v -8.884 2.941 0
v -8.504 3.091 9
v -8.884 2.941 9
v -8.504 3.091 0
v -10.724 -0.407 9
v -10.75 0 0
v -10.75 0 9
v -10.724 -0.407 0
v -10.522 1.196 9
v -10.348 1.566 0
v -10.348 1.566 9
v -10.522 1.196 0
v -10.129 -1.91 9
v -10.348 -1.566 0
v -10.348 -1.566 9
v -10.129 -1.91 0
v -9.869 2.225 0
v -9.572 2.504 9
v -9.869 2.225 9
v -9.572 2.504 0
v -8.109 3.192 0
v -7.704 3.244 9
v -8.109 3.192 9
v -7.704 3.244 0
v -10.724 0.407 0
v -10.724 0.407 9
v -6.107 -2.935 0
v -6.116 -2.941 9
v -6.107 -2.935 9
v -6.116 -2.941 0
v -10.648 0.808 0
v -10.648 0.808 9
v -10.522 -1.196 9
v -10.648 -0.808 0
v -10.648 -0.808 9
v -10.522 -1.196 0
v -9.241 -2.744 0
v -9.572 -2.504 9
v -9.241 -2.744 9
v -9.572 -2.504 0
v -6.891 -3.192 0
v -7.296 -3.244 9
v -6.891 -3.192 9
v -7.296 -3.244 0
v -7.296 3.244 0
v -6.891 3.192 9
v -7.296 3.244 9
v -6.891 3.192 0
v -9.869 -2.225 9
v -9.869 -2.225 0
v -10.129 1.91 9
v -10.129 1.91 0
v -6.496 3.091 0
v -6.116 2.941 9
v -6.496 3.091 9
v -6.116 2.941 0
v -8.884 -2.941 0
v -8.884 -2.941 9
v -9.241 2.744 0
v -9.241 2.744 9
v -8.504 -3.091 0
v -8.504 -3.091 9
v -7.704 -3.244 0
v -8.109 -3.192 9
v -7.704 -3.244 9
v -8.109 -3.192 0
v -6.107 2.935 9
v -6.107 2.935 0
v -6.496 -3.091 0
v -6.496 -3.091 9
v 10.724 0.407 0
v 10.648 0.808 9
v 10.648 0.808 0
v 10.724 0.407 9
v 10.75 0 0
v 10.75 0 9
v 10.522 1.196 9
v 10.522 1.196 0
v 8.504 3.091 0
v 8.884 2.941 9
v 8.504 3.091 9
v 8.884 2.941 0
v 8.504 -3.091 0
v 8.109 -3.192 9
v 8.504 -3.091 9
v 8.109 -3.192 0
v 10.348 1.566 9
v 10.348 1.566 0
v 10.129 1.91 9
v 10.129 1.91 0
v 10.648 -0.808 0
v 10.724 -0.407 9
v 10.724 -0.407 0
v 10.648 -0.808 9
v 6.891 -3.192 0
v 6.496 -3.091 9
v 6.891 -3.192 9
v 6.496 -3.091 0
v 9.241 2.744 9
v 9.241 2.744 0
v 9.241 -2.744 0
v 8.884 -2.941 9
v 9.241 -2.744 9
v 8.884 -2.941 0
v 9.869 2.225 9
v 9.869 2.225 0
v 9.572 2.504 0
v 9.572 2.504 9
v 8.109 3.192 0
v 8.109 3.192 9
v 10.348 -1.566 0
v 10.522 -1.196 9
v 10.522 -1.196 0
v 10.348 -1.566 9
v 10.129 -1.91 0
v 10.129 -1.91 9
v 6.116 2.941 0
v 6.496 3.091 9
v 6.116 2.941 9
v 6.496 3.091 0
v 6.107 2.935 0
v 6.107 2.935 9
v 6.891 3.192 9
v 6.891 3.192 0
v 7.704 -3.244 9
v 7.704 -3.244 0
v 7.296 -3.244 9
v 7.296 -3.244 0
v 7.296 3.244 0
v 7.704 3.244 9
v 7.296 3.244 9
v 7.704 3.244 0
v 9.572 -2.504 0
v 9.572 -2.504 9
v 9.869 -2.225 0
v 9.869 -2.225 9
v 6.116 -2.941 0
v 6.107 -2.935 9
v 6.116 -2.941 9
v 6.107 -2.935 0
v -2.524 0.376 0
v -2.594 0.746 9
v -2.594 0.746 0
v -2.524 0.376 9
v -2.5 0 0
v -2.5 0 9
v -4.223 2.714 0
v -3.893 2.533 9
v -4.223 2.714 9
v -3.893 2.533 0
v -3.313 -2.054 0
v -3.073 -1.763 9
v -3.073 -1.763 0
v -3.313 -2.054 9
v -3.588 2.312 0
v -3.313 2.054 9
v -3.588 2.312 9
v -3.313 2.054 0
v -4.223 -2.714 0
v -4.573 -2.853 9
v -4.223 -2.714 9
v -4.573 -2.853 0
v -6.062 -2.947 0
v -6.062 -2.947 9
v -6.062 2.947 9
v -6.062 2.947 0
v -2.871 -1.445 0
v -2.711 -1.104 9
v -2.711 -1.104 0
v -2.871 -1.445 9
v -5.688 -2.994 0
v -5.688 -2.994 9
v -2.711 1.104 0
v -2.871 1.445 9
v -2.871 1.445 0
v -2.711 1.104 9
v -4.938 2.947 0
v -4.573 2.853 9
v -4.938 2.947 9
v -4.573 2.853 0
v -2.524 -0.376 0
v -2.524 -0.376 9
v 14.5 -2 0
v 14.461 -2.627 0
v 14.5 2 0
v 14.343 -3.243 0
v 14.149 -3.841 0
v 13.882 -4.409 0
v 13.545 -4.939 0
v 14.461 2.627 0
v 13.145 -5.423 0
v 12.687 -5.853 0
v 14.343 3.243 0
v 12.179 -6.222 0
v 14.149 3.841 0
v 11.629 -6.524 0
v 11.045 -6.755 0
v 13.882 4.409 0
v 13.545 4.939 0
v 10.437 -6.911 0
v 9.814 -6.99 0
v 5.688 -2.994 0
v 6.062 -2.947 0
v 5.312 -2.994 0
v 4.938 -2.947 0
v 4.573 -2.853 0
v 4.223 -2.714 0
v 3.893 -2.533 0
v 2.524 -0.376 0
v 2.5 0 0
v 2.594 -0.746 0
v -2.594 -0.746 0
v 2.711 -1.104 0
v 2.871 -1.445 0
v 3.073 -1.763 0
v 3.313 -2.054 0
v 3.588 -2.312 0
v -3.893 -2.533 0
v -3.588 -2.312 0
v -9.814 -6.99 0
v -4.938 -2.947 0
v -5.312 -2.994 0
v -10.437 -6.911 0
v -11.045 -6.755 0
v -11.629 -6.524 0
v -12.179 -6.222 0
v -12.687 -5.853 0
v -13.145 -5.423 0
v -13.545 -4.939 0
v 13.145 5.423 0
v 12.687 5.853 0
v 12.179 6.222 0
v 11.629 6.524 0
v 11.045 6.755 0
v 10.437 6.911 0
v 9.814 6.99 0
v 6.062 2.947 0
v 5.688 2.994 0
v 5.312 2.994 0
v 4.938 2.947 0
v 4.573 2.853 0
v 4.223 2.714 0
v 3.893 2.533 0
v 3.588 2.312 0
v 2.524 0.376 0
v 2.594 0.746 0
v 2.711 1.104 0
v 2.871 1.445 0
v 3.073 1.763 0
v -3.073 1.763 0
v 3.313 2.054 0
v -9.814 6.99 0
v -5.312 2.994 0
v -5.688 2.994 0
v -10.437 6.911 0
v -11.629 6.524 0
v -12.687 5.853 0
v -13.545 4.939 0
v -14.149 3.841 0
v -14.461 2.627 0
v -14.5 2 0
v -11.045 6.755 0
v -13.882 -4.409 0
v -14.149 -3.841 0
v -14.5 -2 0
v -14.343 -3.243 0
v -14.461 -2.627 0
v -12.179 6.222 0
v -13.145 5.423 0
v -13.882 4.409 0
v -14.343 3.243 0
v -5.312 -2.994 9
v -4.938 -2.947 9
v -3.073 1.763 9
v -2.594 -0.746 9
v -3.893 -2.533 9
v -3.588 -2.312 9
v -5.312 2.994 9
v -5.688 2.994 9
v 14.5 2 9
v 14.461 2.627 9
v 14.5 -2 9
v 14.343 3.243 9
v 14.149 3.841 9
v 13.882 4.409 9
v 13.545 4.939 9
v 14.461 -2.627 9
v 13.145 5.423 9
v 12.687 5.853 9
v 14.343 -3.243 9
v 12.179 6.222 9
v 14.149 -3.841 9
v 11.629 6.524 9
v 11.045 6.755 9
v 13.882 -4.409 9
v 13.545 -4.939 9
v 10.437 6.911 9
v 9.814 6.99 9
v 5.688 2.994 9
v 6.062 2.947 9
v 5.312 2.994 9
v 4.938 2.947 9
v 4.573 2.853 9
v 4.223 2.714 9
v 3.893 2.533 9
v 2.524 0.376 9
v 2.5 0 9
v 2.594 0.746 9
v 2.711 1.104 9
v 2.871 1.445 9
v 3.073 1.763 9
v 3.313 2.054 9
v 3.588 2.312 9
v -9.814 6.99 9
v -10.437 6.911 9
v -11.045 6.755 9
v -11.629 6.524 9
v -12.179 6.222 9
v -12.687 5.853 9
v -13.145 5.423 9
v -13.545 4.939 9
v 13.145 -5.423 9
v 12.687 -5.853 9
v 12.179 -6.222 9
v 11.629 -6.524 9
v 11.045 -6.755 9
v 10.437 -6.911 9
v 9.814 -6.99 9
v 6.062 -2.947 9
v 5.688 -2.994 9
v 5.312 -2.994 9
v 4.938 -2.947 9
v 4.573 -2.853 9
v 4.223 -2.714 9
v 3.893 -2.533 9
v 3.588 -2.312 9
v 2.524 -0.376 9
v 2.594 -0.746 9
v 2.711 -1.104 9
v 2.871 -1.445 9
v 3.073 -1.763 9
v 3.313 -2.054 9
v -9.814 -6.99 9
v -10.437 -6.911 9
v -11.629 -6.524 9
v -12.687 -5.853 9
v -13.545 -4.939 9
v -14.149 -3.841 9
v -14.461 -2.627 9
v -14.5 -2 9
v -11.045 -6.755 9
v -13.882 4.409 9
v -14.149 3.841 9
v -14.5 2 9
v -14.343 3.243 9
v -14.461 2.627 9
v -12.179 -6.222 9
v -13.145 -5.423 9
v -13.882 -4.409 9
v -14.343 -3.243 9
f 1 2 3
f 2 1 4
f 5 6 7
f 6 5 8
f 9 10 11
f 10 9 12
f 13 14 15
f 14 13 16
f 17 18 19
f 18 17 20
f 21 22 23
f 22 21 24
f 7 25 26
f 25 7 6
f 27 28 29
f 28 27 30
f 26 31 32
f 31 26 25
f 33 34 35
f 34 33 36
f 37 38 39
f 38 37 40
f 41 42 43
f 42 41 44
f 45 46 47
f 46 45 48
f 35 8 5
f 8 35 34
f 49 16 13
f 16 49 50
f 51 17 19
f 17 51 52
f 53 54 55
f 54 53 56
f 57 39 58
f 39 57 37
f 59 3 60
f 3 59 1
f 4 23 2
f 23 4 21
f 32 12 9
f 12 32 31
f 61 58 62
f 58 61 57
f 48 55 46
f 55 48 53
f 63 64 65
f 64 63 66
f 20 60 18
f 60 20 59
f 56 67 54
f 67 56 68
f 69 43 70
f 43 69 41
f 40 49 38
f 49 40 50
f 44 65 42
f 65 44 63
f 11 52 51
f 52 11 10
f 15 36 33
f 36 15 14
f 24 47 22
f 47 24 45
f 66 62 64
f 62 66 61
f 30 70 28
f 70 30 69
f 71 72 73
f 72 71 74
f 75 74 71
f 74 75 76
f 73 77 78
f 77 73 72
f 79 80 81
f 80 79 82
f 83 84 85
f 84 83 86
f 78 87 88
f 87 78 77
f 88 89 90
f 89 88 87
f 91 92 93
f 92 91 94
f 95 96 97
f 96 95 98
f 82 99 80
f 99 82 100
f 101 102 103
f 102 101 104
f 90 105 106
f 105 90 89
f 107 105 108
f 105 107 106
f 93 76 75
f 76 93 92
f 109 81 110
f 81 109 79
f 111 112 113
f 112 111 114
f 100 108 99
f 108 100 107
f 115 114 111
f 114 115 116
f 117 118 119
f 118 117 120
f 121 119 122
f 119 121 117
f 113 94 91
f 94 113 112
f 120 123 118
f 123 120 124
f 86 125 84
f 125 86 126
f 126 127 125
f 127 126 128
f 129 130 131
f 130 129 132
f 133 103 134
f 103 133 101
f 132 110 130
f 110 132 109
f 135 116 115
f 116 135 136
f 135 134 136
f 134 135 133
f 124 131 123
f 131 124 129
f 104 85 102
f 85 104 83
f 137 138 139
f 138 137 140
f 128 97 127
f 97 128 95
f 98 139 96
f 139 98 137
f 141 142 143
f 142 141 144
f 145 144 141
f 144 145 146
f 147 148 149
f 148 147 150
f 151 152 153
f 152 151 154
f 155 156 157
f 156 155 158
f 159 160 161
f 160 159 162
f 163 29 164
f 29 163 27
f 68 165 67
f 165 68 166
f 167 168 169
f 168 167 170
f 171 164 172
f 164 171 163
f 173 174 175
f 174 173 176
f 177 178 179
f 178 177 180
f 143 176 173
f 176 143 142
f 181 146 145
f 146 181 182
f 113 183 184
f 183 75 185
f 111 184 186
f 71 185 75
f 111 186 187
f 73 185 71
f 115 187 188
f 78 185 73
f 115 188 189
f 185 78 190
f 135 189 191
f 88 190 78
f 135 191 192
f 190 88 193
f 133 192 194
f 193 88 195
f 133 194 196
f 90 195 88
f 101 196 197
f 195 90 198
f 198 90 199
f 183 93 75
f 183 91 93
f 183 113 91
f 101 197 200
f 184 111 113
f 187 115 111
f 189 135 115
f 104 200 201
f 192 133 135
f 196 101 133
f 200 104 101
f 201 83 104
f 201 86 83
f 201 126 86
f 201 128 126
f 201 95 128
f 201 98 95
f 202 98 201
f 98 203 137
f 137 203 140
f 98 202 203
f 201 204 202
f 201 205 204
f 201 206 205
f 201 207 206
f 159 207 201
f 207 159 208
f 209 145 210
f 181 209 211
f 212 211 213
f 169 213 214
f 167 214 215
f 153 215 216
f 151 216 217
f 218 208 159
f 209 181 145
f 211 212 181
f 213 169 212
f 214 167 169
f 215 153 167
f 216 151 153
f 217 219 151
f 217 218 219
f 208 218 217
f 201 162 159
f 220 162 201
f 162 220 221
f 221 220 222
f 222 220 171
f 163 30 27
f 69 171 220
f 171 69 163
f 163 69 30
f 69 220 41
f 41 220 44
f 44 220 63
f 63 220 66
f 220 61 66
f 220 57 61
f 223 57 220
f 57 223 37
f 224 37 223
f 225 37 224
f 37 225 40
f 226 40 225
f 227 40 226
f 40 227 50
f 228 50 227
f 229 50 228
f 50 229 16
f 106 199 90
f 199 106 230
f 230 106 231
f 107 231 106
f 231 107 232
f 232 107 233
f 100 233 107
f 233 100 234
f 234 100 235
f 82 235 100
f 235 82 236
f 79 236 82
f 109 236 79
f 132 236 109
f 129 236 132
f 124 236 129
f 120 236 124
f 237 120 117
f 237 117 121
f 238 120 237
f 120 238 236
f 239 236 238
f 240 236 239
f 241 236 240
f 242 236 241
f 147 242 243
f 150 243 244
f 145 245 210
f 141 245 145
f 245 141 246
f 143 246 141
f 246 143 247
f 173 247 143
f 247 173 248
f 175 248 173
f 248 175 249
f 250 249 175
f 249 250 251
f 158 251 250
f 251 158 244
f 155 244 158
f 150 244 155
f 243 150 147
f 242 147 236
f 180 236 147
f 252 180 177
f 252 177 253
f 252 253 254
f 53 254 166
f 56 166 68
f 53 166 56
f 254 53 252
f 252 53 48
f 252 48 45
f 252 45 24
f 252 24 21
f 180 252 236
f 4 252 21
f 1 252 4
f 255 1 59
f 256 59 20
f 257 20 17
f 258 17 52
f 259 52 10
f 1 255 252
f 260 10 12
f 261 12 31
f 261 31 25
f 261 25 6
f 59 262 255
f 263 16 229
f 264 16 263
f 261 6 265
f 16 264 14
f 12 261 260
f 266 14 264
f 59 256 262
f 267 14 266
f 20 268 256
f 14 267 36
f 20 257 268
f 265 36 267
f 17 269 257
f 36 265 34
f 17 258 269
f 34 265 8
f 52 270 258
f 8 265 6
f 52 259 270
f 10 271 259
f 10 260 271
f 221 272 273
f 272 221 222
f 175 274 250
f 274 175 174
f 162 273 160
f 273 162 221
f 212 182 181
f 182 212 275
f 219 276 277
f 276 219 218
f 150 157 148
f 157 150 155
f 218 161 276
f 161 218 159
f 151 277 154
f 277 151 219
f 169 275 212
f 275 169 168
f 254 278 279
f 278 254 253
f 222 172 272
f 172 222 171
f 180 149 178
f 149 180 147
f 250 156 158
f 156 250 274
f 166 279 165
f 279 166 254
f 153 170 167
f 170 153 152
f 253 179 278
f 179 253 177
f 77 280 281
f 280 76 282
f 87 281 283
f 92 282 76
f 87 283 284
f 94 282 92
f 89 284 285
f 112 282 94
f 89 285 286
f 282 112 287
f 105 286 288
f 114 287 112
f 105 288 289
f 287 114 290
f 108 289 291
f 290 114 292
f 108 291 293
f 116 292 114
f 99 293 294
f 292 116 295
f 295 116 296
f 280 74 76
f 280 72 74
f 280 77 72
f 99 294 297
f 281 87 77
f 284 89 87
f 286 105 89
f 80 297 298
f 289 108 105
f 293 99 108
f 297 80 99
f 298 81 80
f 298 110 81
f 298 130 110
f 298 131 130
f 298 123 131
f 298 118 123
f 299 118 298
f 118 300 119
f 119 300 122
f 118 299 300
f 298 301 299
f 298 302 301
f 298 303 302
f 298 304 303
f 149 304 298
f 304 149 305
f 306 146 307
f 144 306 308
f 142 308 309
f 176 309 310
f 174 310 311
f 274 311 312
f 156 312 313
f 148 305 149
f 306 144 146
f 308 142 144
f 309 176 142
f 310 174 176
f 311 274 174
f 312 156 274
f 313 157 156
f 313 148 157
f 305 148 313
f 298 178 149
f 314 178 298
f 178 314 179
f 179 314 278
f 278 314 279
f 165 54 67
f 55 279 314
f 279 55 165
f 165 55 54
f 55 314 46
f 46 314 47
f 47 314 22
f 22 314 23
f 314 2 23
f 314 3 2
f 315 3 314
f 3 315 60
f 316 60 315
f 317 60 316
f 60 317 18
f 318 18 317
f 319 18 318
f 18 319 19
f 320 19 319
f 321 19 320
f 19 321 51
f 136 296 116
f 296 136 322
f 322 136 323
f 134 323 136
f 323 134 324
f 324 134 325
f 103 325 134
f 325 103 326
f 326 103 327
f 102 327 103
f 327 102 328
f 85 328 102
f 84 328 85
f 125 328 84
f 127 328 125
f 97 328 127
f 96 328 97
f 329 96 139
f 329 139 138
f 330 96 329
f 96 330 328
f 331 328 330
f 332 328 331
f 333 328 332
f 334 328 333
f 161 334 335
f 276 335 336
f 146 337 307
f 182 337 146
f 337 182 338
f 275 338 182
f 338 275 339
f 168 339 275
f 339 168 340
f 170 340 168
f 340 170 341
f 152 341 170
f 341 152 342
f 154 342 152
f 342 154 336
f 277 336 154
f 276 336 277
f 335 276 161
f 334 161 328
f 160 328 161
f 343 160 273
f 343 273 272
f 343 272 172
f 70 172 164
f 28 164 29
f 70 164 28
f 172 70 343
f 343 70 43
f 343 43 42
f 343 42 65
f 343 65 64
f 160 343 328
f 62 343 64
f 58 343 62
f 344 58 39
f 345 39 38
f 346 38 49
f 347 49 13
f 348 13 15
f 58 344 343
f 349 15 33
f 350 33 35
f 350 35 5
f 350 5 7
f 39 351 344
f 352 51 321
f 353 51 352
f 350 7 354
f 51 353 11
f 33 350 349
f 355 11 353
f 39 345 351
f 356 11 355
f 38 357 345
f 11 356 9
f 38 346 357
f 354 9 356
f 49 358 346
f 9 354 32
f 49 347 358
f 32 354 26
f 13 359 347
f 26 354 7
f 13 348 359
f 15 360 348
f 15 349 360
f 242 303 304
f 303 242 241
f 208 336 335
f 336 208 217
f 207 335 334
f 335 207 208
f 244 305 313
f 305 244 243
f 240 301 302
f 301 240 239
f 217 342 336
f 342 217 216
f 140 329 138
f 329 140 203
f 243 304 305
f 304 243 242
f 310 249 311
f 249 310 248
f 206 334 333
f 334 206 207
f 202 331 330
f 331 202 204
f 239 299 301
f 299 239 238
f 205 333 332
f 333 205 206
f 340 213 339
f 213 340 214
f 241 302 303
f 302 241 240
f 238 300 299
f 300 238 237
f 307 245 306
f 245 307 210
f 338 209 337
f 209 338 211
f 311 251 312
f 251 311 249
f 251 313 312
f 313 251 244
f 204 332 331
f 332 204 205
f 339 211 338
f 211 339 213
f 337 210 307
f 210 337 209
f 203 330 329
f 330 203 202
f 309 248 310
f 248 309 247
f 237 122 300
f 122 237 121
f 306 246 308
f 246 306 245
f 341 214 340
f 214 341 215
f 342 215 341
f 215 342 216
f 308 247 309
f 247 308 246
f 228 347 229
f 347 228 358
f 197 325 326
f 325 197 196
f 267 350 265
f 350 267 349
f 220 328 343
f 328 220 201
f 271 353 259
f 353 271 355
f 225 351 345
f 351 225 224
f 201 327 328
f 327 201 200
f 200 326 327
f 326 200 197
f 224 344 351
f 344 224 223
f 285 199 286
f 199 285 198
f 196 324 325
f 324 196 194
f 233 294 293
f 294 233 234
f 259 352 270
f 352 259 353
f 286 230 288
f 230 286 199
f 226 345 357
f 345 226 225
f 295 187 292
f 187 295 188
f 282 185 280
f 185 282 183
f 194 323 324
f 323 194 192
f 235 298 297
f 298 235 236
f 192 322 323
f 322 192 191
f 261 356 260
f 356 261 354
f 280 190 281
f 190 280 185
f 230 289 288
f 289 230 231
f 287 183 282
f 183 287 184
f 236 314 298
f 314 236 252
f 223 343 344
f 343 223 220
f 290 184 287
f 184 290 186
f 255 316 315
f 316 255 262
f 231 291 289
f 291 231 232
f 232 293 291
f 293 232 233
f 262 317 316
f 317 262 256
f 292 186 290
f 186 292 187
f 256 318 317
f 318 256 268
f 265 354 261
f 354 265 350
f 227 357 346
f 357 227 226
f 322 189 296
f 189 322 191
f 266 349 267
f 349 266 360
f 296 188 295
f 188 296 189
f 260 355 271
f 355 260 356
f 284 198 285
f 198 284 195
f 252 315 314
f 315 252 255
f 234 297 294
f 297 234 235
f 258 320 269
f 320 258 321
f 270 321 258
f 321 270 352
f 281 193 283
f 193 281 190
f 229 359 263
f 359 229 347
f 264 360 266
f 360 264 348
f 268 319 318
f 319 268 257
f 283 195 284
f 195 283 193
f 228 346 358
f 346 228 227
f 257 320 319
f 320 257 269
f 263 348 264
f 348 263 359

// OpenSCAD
$fn = 50;

difference() {
	union() {
		hull() {
			translate(v = [-9.5, 2.0, 0]) {
				cylinder(h = 9, r = 5);
			}
			translate(v = [9.5, 2.0, 0]) {
				cylinder(h = 9, r = 5);
			}
			translate(v = [-9.5, -2.0, 0]) {
				cylinder(h = 9, r = 5);
			}
			translate(v = [9.5, -2.0, 0]) {
				cylinder(h = 9, r = 5);
			}
		}
	}
	union() {
		translate(v = [-7.5, 0.0, -100.0]) {
			cylinder(h = 200, r = 3.25);
		}
		translate(v = [7.5, 0.0, -100.0]) {
			cylinder(h = 200, r = 3.25);
		}
		translate(v = [-7.5, 0.0, -100.0]) {
			cylinder(h = 200, r = 1.8);
		}
		translate(v = [7.5, 0.0, -100.0]) {
			cylinder(h = 200, r = 1.8);
		}
		translate(v = [-5.5, 0, 0.0]) {
			cylinder(h = 9, r = 3.0);
		}
		translate(v = [5.5, 0, 0.0]) {
			cylinder(h = 9, r = 3.0);
		}
	}
}
